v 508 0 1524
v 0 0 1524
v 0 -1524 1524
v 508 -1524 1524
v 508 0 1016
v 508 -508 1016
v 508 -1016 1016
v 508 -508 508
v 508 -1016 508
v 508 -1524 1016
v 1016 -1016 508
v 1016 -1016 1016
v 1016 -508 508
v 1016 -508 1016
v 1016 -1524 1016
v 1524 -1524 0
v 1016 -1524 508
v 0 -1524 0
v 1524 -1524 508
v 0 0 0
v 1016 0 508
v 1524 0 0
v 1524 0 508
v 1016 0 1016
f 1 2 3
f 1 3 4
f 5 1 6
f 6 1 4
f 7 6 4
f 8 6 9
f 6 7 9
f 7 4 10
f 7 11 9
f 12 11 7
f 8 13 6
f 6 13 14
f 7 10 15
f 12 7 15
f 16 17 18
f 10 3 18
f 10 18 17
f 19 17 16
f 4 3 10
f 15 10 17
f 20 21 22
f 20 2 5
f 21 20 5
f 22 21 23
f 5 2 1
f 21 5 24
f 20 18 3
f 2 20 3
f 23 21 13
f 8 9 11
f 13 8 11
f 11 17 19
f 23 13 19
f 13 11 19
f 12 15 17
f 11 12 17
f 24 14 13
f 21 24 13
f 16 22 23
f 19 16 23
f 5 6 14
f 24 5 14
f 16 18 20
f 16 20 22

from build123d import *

# Parameters (mm, degrees)
F0_W     = 1524
F0_H     = 1524
F1_DEPTH = 1524
F3_DEPTH = 1524
F4_W     = 508
F4_H     = 508
F5_DEPTH = 508


with BuildPart() as f1:
    # F0 (on Front) → F1 (new body)
    with BuildSketch(Plane.XZ):
        with Locations((762, 762)):
            Rectangle(F0_W, F0_H)
    extrude(amount=F1_DEPTH)

    # F2 (on face) → F3 (cut)
    with BuildSketch(Plane.XZ.offset(1524)):
        Polygon((1524, 1524), (508, 1524), (508, 1016), (1016, 1016), (1016, 508), (1524, 508), align=None)
    extrude(amount=-F3_DEPTH, mode=Mode.SUBTRACT)

    # F4 (on face) → F5 (cut)
    with BuildSketch(Plane.YZ.offset(1016)):
        with Locations((-762, 762)):
            Rectangle(F4_W, F4_H)
    extrude(amount=-F5_DEPTH, mode=Mode.SUBTRACT)


solid = f1.part
